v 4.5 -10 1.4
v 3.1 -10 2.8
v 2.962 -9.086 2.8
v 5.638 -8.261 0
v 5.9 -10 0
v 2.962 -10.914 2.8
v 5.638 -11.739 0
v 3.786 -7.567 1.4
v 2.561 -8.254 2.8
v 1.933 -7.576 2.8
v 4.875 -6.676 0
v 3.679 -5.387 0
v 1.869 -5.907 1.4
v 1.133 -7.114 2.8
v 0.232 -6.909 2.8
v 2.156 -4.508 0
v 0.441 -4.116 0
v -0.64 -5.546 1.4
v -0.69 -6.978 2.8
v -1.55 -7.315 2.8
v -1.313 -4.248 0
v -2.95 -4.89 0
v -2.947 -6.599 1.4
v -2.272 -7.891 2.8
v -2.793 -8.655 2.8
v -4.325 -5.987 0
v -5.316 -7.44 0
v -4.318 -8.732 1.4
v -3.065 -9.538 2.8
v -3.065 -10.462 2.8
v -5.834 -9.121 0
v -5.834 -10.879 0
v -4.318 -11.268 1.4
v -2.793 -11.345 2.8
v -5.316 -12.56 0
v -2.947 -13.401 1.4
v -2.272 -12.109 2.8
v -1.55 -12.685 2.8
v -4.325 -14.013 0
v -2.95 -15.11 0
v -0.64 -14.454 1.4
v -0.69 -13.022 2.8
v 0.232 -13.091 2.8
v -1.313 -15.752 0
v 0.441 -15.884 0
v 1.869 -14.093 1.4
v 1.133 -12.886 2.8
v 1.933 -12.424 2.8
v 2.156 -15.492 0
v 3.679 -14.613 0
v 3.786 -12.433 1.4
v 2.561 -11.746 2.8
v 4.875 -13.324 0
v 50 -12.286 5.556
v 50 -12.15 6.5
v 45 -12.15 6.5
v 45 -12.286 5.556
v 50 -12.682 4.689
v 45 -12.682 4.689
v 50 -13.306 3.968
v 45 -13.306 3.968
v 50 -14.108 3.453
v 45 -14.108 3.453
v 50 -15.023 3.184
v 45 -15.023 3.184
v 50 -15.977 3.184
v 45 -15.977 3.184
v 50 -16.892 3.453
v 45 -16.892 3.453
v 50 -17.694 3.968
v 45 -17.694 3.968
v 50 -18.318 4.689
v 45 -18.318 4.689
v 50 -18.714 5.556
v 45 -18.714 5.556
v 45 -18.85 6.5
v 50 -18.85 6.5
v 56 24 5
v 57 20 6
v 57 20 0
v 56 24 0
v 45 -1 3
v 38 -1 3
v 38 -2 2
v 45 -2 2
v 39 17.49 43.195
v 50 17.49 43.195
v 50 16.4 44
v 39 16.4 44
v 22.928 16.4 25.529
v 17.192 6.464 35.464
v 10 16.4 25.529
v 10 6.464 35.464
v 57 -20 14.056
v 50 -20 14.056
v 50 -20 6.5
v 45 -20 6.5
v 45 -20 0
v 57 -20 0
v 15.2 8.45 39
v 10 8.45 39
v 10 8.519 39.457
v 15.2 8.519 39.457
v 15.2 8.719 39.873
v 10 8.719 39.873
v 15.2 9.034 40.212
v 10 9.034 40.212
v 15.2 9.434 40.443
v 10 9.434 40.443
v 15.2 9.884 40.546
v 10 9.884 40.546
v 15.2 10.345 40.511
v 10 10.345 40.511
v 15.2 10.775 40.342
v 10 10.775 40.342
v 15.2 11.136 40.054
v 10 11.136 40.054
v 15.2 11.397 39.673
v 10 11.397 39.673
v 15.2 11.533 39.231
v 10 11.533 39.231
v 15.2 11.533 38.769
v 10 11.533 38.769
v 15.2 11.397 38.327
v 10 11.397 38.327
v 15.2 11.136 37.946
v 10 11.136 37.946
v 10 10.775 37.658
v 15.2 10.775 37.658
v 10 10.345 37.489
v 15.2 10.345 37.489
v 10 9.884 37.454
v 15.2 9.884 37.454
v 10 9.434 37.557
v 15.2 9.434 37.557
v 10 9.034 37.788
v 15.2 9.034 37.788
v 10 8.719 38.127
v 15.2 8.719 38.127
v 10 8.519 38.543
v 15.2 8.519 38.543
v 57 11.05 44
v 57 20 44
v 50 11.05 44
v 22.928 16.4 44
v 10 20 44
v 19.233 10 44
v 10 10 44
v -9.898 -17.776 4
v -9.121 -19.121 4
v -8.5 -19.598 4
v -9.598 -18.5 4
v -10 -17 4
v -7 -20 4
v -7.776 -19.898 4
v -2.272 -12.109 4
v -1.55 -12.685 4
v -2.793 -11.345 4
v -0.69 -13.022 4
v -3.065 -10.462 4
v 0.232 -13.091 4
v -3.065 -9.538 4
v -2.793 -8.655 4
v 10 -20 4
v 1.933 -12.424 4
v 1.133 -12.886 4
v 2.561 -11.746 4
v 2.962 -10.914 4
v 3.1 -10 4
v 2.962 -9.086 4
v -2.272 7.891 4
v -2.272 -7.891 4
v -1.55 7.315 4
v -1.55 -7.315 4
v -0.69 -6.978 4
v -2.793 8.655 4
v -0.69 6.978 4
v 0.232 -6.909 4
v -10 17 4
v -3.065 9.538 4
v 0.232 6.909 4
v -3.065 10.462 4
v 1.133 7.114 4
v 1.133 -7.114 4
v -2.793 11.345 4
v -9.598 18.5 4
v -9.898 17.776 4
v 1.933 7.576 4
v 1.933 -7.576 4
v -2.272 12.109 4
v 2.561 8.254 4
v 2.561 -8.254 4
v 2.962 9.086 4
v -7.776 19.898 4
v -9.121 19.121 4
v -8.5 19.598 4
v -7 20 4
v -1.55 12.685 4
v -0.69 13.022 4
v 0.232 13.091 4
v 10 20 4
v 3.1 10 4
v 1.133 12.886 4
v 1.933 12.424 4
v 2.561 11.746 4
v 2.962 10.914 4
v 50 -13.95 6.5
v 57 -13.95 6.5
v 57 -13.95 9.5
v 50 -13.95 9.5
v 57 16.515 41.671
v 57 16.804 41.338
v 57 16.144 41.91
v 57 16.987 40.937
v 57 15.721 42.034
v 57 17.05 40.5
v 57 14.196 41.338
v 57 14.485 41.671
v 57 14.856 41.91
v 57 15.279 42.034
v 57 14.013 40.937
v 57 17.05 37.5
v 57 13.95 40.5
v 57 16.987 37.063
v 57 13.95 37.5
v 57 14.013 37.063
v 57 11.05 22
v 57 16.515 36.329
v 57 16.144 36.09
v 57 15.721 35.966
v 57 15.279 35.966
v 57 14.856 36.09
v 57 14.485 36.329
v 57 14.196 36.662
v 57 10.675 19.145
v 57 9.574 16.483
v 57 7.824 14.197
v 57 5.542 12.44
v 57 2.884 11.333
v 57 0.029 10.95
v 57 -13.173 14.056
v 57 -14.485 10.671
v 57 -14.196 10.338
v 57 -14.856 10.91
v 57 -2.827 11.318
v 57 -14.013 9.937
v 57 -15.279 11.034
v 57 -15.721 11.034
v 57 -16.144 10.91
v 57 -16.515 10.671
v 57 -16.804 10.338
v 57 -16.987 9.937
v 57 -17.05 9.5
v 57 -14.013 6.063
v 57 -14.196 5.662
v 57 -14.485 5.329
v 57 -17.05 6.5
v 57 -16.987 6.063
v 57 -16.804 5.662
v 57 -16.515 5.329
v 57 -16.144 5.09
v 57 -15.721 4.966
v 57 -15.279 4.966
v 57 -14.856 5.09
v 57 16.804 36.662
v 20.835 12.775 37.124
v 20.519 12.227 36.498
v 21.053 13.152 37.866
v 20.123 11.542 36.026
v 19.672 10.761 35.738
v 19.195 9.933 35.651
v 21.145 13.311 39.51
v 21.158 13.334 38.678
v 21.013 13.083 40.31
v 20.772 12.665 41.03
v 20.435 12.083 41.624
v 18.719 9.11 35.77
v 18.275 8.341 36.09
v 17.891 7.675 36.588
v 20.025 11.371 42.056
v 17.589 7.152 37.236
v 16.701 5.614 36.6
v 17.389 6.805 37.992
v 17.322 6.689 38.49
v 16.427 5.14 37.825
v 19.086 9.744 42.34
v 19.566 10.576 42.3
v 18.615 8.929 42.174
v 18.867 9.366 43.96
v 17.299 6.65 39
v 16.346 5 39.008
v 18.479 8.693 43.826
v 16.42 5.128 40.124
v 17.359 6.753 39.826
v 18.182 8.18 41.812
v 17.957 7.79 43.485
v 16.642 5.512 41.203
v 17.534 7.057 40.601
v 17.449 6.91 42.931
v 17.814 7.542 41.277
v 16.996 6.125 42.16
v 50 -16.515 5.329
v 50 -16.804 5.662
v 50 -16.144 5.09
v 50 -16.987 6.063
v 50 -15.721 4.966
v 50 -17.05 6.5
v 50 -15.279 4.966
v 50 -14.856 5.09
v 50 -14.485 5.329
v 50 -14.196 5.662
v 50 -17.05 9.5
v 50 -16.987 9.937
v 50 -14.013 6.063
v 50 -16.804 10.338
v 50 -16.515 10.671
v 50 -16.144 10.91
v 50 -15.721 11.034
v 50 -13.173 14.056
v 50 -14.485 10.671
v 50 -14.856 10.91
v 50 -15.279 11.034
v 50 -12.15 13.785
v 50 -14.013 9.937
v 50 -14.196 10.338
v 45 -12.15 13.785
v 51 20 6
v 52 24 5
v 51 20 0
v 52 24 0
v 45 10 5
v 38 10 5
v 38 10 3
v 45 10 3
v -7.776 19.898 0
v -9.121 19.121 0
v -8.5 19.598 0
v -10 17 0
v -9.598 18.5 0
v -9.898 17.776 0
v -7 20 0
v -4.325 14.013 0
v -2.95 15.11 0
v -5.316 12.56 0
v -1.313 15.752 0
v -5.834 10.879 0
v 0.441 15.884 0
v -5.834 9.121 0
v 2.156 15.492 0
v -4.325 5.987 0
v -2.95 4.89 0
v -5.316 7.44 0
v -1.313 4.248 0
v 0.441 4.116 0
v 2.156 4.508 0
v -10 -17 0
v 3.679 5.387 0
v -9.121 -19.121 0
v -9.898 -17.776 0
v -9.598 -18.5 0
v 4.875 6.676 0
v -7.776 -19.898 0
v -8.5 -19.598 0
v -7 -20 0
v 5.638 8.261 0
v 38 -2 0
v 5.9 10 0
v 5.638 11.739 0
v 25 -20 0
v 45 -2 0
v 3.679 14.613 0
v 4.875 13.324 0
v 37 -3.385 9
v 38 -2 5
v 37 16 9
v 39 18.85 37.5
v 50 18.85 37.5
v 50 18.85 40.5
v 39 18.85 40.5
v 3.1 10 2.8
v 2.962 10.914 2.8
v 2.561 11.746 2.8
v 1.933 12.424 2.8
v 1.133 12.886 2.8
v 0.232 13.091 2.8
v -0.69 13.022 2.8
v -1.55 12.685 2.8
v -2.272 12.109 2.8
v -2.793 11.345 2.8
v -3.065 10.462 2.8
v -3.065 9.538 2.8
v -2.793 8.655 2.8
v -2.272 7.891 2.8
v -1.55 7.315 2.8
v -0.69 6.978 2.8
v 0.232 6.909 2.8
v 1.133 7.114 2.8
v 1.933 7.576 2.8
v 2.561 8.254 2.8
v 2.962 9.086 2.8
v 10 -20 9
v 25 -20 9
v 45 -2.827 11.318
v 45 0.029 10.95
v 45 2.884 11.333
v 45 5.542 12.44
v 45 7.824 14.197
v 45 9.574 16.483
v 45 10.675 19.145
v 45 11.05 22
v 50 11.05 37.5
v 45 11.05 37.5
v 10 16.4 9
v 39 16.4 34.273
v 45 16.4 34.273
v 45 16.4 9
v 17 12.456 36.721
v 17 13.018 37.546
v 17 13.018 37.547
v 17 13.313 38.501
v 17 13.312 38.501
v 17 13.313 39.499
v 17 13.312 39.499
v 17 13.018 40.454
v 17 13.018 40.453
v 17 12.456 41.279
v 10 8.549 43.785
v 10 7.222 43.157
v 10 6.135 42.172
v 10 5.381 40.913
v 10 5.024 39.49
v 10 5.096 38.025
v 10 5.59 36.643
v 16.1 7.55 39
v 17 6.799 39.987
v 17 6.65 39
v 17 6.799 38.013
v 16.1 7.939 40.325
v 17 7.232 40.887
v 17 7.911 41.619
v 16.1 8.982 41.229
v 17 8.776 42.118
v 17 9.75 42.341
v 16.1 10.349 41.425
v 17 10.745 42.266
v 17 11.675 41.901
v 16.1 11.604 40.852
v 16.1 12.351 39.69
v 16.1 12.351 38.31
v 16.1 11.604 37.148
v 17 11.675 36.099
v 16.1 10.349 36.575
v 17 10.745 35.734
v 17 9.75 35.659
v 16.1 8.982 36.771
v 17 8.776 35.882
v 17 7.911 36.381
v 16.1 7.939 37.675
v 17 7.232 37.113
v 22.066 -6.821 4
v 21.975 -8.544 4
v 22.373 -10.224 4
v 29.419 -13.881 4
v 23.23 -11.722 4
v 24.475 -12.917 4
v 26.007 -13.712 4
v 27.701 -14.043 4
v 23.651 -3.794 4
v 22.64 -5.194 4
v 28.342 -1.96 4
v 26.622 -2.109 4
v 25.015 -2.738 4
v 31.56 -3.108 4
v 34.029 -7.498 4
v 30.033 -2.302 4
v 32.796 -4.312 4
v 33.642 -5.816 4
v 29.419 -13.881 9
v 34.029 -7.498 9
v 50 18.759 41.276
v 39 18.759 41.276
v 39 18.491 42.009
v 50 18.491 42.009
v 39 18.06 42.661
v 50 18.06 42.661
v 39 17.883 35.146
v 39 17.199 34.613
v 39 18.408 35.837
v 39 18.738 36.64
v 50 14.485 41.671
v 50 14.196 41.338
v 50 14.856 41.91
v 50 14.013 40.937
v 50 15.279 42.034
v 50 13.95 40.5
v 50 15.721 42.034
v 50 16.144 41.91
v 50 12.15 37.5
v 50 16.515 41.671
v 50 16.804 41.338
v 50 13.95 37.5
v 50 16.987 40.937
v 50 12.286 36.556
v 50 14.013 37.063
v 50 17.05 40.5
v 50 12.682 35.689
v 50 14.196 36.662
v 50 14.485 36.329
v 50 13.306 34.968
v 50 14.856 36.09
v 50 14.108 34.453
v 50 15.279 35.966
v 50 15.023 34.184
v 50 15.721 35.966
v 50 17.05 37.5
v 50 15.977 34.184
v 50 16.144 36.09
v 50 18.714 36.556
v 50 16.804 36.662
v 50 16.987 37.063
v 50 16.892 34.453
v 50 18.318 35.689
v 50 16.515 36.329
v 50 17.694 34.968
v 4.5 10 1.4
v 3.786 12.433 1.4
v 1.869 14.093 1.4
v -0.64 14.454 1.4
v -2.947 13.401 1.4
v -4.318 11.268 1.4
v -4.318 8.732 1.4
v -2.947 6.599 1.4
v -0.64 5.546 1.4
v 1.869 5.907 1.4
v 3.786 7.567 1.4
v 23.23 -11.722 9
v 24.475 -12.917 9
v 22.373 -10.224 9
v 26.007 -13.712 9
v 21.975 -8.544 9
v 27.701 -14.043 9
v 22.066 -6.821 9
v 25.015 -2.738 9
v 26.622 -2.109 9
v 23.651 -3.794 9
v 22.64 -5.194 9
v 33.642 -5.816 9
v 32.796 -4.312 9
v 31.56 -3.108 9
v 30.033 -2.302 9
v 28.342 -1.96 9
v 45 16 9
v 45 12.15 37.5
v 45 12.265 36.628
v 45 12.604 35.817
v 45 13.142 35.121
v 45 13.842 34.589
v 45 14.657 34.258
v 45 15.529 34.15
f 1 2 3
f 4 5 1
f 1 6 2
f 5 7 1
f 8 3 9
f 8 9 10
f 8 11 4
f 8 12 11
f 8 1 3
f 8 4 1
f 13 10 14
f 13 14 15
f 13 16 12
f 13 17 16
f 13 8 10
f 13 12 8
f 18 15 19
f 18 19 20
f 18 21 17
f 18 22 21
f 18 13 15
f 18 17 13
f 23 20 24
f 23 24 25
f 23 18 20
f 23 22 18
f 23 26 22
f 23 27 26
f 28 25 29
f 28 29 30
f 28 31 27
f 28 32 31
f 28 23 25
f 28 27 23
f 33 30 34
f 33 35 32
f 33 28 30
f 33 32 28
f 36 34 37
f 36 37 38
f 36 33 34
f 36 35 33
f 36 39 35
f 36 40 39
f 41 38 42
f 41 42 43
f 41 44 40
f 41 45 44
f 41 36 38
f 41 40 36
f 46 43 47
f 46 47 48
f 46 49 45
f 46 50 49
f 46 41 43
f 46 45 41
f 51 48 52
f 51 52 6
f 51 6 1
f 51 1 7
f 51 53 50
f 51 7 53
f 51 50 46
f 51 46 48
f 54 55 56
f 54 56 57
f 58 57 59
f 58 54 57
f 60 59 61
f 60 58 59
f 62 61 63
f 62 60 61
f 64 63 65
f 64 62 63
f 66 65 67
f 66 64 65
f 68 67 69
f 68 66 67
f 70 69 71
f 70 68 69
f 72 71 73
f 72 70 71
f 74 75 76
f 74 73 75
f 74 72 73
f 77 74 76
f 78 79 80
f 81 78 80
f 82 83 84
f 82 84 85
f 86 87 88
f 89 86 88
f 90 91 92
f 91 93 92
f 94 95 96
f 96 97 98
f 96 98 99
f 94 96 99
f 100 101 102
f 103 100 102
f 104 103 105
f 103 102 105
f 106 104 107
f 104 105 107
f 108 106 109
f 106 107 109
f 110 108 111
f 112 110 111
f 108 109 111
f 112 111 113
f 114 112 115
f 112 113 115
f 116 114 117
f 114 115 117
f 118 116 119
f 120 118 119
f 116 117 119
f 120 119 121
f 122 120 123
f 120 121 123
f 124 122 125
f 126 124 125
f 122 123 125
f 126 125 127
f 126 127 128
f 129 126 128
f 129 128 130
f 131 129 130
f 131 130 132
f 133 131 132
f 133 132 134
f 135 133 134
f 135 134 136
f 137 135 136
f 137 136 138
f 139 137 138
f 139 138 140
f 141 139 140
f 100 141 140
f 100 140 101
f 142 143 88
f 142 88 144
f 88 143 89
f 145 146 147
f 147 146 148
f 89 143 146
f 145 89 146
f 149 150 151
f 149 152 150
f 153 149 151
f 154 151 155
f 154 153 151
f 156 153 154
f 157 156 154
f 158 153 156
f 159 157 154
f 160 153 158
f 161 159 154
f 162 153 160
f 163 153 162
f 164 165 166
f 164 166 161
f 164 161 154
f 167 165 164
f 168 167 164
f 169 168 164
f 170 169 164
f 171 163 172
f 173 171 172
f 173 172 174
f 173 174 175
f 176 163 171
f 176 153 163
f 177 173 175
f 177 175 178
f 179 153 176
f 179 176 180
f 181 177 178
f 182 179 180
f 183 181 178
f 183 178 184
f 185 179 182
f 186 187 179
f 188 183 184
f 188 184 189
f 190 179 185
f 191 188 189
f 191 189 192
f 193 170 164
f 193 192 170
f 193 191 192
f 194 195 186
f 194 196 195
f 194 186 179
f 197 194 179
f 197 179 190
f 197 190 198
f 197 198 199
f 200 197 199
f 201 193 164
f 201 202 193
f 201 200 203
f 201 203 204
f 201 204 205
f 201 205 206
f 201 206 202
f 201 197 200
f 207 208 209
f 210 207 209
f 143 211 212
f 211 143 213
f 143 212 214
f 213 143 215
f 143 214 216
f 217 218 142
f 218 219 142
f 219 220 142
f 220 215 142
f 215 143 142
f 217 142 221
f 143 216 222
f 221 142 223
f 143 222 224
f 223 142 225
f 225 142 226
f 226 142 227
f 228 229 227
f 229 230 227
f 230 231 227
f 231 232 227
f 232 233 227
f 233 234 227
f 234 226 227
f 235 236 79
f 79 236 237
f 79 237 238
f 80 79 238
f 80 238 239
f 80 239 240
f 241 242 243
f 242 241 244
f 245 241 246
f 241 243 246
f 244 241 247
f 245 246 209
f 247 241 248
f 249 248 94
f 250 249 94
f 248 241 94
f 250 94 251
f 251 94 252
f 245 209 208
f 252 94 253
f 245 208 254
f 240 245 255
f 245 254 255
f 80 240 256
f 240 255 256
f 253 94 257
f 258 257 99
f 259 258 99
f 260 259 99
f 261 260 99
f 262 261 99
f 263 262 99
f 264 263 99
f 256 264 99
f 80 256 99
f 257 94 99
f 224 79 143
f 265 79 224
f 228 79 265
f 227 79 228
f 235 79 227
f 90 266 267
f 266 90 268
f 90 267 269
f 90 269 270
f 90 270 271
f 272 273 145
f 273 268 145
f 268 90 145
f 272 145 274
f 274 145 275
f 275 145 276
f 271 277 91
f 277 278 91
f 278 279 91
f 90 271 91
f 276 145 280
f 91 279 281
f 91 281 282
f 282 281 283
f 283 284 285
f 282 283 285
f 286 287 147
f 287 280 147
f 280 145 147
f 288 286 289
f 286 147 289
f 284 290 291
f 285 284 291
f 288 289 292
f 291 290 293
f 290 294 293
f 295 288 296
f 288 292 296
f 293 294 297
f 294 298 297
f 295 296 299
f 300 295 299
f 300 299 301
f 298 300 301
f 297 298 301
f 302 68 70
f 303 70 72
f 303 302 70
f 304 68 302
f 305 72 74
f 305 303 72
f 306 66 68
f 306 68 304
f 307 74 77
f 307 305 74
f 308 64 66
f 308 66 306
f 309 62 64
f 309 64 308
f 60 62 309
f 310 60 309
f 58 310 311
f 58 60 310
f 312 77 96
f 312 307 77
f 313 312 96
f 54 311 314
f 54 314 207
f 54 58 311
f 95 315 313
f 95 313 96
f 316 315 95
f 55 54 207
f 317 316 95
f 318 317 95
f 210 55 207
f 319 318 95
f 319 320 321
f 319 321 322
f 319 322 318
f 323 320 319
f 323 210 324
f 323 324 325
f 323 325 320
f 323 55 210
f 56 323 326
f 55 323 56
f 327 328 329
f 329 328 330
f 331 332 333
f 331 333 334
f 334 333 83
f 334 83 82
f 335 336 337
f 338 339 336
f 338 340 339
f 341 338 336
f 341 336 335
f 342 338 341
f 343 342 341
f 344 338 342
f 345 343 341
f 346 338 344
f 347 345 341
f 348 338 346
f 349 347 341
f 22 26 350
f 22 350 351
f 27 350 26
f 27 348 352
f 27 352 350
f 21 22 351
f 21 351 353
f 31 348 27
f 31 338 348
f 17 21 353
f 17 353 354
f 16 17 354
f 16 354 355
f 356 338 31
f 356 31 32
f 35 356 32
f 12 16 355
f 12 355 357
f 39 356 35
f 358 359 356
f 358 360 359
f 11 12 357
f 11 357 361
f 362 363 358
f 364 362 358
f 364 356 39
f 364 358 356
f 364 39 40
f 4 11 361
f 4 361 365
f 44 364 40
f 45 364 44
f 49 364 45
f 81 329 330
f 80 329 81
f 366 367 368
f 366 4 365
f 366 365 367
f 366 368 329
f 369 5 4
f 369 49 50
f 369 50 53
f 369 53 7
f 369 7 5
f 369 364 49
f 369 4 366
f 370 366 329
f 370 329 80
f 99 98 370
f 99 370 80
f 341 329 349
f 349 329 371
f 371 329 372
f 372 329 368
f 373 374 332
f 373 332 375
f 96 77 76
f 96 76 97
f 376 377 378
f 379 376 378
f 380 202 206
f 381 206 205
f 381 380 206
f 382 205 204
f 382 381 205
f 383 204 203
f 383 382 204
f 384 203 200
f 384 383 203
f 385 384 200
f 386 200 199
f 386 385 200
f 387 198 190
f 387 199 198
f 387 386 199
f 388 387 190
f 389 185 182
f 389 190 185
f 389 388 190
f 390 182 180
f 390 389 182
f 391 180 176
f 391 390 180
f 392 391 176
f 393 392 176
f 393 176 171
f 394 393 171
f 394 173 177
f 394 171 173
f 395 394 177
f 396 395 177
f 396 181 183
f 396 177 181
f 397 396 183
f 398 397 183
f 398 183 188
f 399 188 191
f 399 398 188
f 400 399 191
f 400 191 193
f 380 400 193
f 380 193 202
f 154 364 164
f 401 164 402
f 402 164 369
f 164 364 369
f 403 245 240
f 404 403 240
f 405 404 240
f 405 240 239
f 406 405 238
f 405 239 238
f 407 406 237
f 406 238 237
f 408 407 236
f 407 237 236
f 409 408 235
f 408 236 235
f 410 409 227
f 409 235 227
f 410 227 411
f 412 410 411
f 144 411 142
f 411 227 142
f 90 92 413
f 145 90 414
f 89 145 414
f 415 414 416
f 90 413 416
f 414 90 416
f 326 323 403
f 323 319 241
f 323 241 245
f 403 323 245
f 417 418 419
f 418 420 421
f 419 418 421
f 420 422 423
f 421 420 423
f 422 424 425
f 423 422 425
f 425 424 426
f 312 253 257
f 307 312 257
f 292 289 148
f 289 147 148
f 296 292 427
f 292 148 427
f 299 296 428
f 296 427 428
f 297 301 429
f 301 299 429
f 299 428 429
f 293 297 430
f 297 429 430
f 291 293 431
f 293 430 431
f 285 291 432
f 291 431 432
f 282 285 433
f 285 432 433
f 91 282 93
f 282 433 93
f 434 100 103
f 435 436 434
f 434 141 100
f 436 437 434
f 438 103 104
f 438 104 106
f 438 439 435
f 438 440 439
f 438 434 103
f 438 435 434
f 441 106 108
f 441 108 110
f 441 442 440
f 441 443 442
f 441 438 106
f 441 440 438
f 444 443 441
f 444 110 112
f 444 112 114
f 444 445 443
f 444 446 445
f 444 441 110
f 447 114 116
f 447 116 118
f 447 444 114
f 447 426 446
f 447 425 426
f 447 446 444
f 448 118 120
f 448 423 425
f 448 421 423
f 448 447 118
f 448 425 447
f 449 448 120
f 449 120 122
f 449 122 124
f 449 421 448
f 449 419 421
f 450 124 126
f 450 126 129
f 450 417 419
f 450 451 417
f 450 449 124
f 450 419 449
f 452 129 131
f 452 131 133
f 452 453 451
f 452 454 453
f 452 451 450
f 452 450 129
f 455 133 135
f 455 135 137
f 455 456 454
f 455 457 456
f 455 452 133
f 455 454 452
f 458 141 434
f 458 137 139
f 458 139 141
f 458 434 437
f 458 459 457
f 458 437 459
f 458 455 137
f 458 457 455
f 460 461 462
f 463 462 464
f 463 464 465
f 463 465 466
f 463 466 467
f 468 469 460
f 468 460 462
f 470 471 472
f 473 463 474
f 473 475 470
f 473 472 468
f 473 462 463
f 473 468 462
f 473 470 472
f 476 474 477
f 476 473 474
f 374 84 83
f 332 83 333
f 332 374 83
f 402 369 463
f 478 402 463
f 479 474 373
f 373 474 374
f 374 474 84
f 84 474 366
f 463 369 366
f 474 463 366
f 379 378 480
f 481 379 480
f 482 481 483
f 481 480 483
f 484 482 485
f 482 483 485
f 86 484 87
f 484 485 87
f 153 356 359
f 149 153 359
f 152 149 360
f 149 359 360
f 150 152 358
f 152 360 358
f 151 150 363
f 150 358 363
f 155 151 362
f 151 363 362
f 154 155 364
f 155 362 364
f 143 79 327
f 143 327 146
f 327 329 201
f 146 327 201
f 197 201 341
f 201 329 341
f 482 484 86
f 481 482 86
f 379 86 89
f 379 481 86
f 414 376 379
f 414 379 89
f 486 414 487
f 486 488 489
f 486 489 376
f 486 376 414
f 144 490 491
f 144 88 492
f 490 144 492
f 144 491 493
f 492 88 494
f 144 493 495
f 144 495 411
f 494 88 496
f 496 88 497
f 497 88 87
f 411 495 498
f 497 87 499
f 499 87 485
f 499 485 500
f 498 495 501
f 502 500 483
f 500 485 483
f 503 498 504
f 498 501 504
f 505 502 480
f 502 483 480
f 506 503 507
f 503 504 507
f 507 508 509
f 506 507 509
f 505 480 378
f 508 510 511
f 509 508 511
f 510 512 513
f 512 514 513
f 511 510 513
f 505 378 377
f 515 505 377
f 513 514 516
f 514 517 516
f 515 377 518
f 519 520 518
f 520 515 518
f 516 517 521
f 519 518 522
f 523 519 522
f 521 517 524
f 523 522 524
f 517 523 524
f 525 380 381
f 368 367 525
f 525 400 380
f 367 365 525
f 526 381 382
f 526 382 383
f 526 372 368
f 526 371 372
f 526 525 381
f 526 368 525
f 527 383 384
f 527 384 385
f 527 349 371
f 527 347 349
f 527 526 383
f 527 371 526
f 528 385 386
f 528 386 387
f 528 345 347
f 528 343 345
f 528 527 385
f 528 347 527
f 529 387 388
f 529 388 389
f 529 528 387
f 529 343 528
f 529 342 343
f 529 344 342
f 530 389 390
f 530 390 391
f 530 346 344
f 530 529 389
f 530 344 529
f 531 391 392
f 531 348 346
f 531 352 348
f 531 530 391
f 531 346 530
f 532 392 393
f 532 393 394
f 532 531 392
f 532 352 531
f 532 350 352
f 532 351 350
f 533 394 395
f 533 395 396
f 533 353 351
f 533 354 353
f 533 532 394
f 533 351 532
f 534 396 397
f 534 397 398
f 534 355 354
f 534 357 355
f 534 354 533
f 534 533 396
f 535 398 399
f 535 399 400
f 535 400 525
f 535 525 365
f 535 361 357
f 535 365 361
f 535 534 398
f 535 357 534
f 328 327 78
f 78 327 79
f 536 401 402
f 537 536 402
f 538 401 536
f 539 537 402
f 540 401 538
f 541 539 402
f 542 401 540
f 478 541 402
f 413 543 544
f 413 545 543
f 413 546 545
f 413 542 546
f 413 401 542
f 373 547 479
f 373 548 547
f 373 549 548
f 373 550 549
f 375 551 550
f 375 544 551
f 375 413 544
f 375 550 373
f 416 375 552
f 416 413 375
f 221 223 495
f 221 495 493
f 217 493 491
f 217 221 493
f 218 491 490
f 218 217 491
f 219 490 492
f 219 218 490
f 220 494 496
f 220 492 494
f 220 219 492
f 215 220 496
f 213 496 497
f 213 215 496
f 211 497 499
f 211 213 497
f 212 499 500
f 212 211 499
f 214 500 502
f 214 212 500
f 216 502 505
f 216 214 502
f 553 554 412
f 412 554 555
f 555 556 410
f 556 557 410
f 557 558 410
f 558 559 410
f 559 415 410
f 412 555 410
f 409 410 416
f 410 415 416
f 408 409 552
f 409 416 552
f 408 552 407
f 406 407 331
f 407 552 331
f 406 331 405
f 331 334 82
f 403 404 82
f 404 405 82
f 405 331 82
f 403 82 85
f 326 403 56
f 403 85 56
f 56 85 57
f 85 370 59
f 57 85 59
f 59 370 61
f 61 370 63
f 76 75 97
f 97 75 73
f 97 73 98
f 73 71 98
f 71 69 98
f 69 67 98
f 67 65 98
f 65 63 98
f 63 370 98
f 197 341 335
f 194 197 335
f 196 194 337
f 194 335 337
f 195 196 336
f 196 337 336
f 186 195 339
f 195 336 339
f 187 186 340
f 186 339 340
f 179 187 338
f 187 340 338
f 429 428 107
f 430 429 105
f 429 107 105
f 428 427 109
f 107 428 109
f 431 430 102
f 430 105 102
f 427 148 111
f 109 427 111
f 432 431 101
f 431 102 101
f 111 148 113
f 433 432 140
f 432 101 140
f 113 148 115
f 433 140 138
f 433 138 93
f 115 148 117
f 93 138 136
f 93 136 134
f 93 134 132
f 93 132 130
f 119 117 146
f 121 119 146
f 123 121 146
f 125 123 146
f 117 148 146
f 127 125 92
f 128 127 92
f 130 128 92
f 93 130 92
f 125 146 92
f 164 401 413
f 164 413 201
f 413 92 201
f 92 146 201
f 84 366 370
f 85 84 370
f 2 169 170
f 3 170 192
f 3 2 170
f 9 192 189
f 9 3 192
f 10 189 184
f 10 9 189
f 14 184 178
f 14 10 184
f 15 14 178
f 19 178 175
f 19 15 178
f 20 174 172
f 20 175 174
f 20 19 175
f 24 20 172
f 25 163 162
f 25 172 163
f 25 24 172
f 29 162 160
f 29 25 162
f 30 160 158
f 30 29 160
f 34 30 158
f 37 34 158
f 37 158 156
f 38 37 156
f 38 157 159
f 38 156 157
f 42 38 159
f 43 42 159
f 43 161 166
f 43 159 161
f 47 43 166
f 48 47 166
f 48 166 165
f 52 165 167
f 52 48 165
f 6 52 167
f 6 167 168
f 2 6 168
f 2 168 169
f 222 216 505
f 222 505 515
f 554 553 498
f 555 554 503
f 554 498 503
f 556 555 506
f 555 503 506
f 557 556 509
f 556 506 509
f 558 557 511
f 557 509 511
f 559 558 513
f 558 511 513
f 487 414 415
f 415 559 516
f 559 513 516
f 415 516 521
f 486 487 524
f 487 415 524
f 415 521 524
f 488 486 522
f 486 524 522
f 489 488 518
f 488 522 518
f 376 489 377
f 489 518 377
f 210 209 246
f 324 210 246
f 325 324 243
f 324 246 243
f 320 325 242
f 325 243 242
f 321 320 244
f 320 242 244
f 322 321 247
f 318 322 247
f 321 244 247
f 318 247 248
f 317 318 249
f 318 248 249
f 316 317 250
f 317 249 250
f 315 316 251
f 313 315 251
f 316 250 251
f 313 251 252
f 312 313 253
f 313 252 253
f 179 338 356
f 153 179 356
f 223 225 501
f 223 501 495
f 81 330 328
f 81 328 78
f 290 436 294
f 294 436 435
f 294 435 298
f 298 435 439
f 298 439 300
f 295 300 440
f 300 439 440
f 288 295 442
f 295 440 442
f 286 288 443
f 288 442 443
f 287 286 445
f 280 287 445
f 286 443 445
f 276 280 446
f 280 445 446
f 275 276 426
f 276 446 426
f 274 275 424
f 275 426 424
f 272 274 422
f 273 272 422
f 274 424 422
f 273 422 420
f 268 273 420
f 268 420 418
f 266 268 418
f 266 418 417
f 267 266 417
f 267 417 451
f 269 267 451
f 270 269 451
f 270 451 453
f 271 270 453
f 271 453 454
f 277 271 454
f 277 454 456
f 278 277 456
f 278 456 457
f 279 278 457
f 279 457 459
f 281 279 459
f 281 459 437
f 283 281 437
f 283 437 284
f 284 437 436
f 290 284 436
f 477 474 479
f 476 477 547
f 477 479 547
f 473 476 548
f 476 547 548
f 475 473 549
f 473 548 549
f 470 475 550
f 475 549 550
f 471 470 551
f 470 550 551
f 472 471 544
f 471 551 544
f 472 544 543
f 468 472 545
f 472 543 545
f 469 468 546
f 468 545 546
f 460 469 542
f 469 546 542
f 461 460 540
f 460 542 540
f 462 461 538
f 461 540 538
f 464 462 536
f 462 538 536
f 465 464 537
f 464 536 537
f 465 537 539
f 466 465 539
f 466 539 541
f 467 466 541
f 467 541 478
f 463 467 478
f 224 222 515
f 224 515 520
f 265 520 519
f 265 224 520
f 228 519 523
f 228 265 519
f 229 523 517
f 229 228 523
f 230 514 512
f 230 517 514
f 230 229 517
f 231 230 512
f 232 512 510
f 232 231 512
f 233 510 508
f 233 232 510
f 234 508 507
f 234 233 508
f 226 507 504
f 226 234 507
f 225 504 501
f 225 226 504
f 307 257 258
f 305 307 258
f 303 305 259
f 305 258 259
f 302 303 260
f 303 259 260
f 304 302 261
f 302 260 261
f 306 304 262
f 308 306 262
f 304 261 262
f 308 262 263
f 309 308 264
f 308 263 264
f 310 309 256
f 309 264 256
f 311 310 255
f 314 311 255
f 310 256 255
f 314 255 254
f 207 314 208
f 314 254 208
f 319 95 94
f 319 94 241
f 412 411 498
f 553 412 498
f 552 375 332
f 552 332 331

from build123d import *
from OCP.BRepFilletAPI import BRepFilletAPI_MakeChamfer

# Parameters (mm, degrees)
SKETCH1_R           = 3.1
BOSS_EXTRUDE1_DEPTH = 9
SKETCH2_W           = 20
SKETCH2_H           = 40
CUT_EXTRUDE1_DEPTH  = 5
SKETCH3_R           = 6.05
CUT_EXTRUDE2_DEPTH  = 5
BOSS_EXTRUDE2_DEPTH = 35
SKETCH5_W           = 7
SKETCH5_H           = 12
CUT_EXTRUDE3_DEPTH  = 6
CHAMFER1_SIZE       = 6
CHAMFER1_SIZE2      = 4
CHAMFER2_SIZE       = 1
CUT_EXTRUDE4_DEPTH  = 12
CUT_EXTRUDE5_START  = -7
CUT_EXTRUDE5_DEPTH  = 11
SKETCH8_W           = 6
SKETCH8_H           = 6
BOSS_EXTRUDE3_DEPTH = 4
CHAMFER5_SIZE       = 4
CHAMFER5_SIZE_2     = 1
CHAMFER6_SIZE       = 1
CHAMFER6_SIZE2      = 4
CHAMFER7_SIZE       = 2.8
BOSS_EXTRUDE4_DEPTH = 6
CHAMFER8_START      = 16
CHAMFER8_DEPTH      = 0.515103423
CHAMFER8_START_2    = 16.515103423
CHAMFER8_2_DEPTH    = 6.413099807
CHAMFER8_START_3    = 11.656406461
CHAMFER8_3_DEPTH    = 6.343593539
CUT_EXTRUDE6_REACH  = 70.71
SKETCH10_R          = 1.55
CUT_EXTRUDE7_REACH  = 77.71
CUT_EXTRUDE7_START  = -7
SKETCH11_R          = 3.35
CHAMFER9_SIZE       = 1.8


with BuildPart() as part:
    # Sketch1 → Boss-Extrude1 (new body)
    with BuildSketch(Plane.XY):
        with BuildLine():
            Line((-10, 17), (-10, -17))
            ThreePointArc((-10, -17), (-9.121320344, -19.121320344), (-7, -20))
            Line((-7, -20), (10, -20))
            Line((10, -20), (25, -20))
            Line((25, -20), (38, -2))
            Line((38, -2), (45, -2))
            Line((45, -2), (45, -20))
            Line((45, -20), (57, -20))
            Line((57, -20), (57, 20))
            Line((57, 20), (-7, 20))
            ThreePointArc((-7, 20), (-9.121320344, 19.121320344), (-10, 17))
        make_face()
        with Locations((0, 10)):
            Circle(SKETCH1_R, mode=Mode.SUBTRACT)
        with Locations((0, -10)):
            Circle(SKETCH1_R, mode=Mode.SUBTRACT)
    extrude(amount=BOSS_EXTRUDE1_DEPTH)

    # Sketch2 → Cut-Extrude1 (cut)
    with BuildSketch(Plane.XY.offset(9)):
        Rectangle(SKETCH2_W, SKETCH2_H)
    extrude(amount=-CUT_EXTRUDE1_DEPTH, mode=Mode.SUBTRACT)

    # Sketch3 → Cut-Extrude2 (cut)
    with BuildSketch(Plane.XY.offset(9)):
        with Locations((28, -8)):
            Circle(SKETCH3_R)
    extrude(amount=-CUT_EXTRUDE2_DEPTH, mode=Mode.SUBTRACT)

    # Sketch4 → Boss-Extrude2 (add)
    with BuildSketch(Plane.XY.offset(9)):
        Polygon((45, -20), (57, -20), (57, 20), (10, 20), (10, 16.4), (45, 16.4), align=None)
    extrude(amount=BOSS_EXTRUDE2_DEPTH)

    # Sketch5 → Cut-Extrude3 (cut)
    with BuildSketch(Plane.XY.offset(9)):
        with Locations((41.5, 4)):
            Rectangle(SKETCH5_W, SKETCH5_H)
    extrude(amount=-CUT_EXTRUDE3_DEPTH, mode=Mode.SUBTRACT)

    # Chamfer1
    chamfer1_edges = [part.edges().sort_by_distance(p)[0] for p in [
        (41.5, 10, 9),
    ]]
    chamfer1_side = [part.faces().sort_by_distance(p)[0] for p in [
        (23.115817962, 1.462286031, 9),
    ]]
    chamfer(chamfer1_edges, length=CHAMFER1_SIZE, length2=CHAMFER1_SIZE2, reference=chamfer1_side[0])

    # Chamfer2
    chamfer2_edges = [part.edges().sort_by_distance(p)[0] for p in [
        (41.5, -2, 3),
    ]]
    chamfer(chamfer2_edges, length=CHAMFER2_SIZE)

    # Sketch6 → Cut-Extrude4 (cut)
    with BuildSketch(Plane(origin=(57, 0, 0), x_dir=(0, 0, -1), z_dir=(1, 0, 0))):
        with BuildLine():
            Line((-22, 11.05), (-44, 11.05))
            Line((-44, 11.05), (-44, -20))
            Line((-44, -20), (-14.055648488, -20))
            Line((-14.055648488, -20), (-14.055648488, -13.173106135))
            Line((-14.055648488, -13.173106135), (-11.317710156, -2.826868177))
            ThreePointArc((-11.317710156, -2.826868177), (-13.243876618, 6.740385992), (-22, 11.05))
        make_face()
        with BuildLine():
            Line((-40.5, 17.05), (-37.5, 17.05))
            ThreePointArc((-37.5, 17.05), (-35.95, 15.5), (-37.5, 13.95))
            Line((-37.5, 13.95), (-40.5, 13.95))
            ThreePointArc((-40.5, 13.95), (-42.05, 15.5), (-40.5, 17.05))
        make_face()
        with BuildLine():
            Line((-9.5, -17.05), (-6.5, -17.05))
            ThreePointArc((-6.5, -17.05), (-4.95, -15.5), (-6.5, -13.95))
            Line((-6.5, -13.95), (-9.5, -13.95))
            ThreePointArc((-9.5, -13.95), (-11.05, -15.5), (-9.5, -17.05))
        make_face()
    extrude(amount=-CUT_EXTRUDE4_DEPTH, mode=Mode.SUBTRACT)

    # Sketch7 → Cut-Extrude5 (cut)
    with BuildSketch(Plane(origin=(57, 0, 0), x_dir=(0, 0, -1), z_dir=(1, 0, 0)).offset(CUT_EXTRUDE5_START)):
        with BuildLine():
            Line((-6.5, -18.85), (-6.5, -20))
            Line((-6.5, -20), (-14.055648488, -20))
            Line((-14.055648488, -20), (-14.055648488, -12.15))
            Line((-14.055648488, -12.15), (-6.5, -12.15))
            ThreePointArc((-6.5, -12.15), (-3.15, -15.5), (-6.5, -18.85))
        make_face()
        with BuildLine():
            Line((-37.5, 18.85), (-40.5, 18.85))
            ThreePointArc((-40.5, 18.85), (-42.009108789, 18.490834443), (-43.194623608, 17.490352635))
            Line((-43.194623608, 17.490352635), (-44, 16.4))
            Line((-44, 16.4), (-44, 11.05))
            Line((-44, 11.05), (-37.5, 11.05))
            Line((-37.5, 11.05), (-37.5, 12.15))
            ThreePointArc((-37.5, 12.15), (-34.15, 15.5), (-37.5, 18.85))
        make_face()
    extrude(amount=-CUT_EXTRUDE5_DEPTH, mode=Mode.SUBTRACT)

    # Sketch8 → Boss-Extrude3 (add)
    with BuildSketch(Plane(origin=(0, 20, 0), x_dir=(1, 0, 0), z_dir=(0, 1, 0))):
        with Locations((54, -3)):
            Rectangle(SKETCH8_W, SKETCH8_H)
    extrude(amount=BOSS_EXTRUDE3_DEPTH)

    # Chamfer5
    chamfer5_edges_1 = [part.edges().sort_by_distance(p)[0] for p in [
        (51, 24, 3),
    ]]
    chamfer5_side_1 = [part.faces().sort_by_distance(p)[0] for p in [
        (51, 23.98, 3),
    ]]
    chamfer5_edges_2 = [part.edges().sort_by_distance(p)[0] for p in [
        (54, 24, 6),
    ]]
    chamfer5_side_2 = [part.faces().sort_by_distance(p)[0] for p in [
        (54, 24, 5.98),
    ]]
    chamfer5_edges_3 = [part.edges().sort_by_distance(p)[0] for p in [
        (57, 24, 3),
    ]]
    chamfer5_side_3 = [part.faces().sort_by_distance(p)[0] for p in [
        (56.98, 24, 3),
    ]]
    chamfer5 = BRepFilletAPI_MakeChamfer(part.part.solid().wrapped)
    for e in chamfer5_edges_1:
        chamfer5.Add(CHAMFER5_SIZE - 0.0001, CHAMFER5_SIZE_2 - 0.0001, e.wrapped, chamfer5_side_1[0].wrapped)
    for e in chamfer5_edges_2:
        chamfer5.Add(CHAMFER5_SIZE_2 - 0.0001, CHAMFER5_SIZE - 0.0001, e.wrapped, chamfer5_side_2[0].wrapped)
    for e in chamfer5_edges_3:
        chamfer5.Add(CHAMFER5_SIZE_2 - 0.0001, CHAMFER5_SIZE - 0.0001, e.wrapped, chamfer5_side_3[0].wrapped)
    add(Compound.cast(chamfer5.Shape()), mode=Mode.REPLACE)  # a hair under: the kernel refuses the full size

    # Chamfer6
    chamfer6_edges = [part.edges().sort_by_distance(p)[0] for p in [
        (38, 7, 9),
    ]]
    chamfer6_side = [part.faces().sort_by_distance(p)[0] for p in [
        (22.148058049, 0.854930368, 9),
    ]]
    chamfer(chamfer6_edges, length=CHAMFER6_SIZE, length2=CHAMFER6_SIZE2, reference=chamfer6_side[0])

    # Chamfer7
    chamfer7_edges = [part.edges().sort_by_distance(p)[0] for p in [
        (-3.1, 10, 0),
        (-3.1, -10, 0),
    ]]
    chamfer(chamfer7_edges, length=CHAMFER7_SIZE)

    # Sketch9 → Boss-Extrude4 (add)
    with BuildSketch(Plane.ZY.offset(-10)):
        with BuildLine():
            Line((44, 16.4), (44, 10))
            ThreePointArc((44, 10), (40.913417162, 5.380602337), (35.464466094, 6.464466094))
            Line((35.464466094, 6.464466094), (25.528932188, 16.4))
            Line((25.528932188, 16.4), (44, 16.4))
        make_face()
    extrude(amount=-BOSS_EXTRUDE4_DEPTH)

    # Chamfer8: read off the stored shape, not the designer's step
    # Chamfer8 outline → Chamfer8 (add)
    with BuildSketch(Plane.YZ.offset(CHAMFER8_START)):
        with BuildLine():
            ThreePointArc((10, 44), (5.380602337, 40.913417162), (6.464466094, 35.464466094))
            Line((6.464466094, 35.464466094), (16.4, 25.528932188))
            Line((16.4, 25.528932188), (16.4, 44))
            Line((16.4, 44), (10, 44))
        make_face()
    extrude(amount=CHAMFER8_DEPTH)

    # Chamfer8 2 outline → Chamfer8 2 (add)
    with BuildSketch(Plane.YZ.offset(CHAMFER8_START_2)):
        with BuildLine():
            ThreePointArc((10, 44), (5.380602337, 40.913417162), (6.464466094, 35.464466094))
            Line((6.464466094, 35.464466094), (16.4, 25.528932188))
            Line((16.4, 25.528932188), (16.4, 44))
            Line((16.4, 44), (10, 44))
        make_face()
    extrude(amount=CHAMFER8_2_DEPTH)

    # Chamfer8 3 outline → Chamfer8 3 (cut)
    with BuildSketch(Plane(origin=(0, 0, 0), x_dir=(0.500000000000006, 0.8660254037844353, 0), z_dir=(0.8660254037844352, -0.5000000000000061, 0)).offset(CHAMFER8_START_3)):
        with BuildLine():
            add(Edge.make_bspline(
                [(14.194351887, 35.464466094), (4.33836629, 44), (18.276834792, 44)],
                knots=[5.497787144, 5.497787144, 5.497787144, 7.853981634, 7.853981634, 7.853981634], degree=2, weights=[1, 0.382683432, 1]))
            Line((14.194351887, 35.464466094), (25.666918237, 25.528932188))
            Line((25.666918237, 25.528932188), (25.666918237, 44))
            Line((25.666918237, 44), (18.276834792, 44))
        make_face()
    extrude(amount=CHAMFER8_3_DEPTH, mode=Mode.SUBTRACT)

    # Cut-Extrude6: up to this plane
    cut_extrude6_end = Plane(origin=(22.92820323, 16.4, 44), z_dir=(-0.8660254037844355, 0.5000000000000057, 0))
    # Sketch10 → Cut-Extrude6 (cut, up to the surface)
    with BuildSketch(Plane.ZY.offset(-10), mode=Mode.PRIVATE) as cut_extrude6_sk1:
        with Locations(Location((39, 10, 0), (0, 0, 270))):
            Circle(SKETCH10_R)
    cut_extrude6_tool1 = split(extrude(cut_extrude6_sk1.sketch, amount=-CUT_EXTRUDE6_REACH, mode=Mode.PRIVATE), bisect_by=cut_extrude6_end, keep=Keep.BOTH, mode=Mode.PRIVATE)
    add(cut_extrude6_tool1.solids().sort_by_distance((10, 10, 39))[0], mode=Mode.SUBTRACT)

    # Sketch11 → Cut-Extrude7 (cut, up to next)
    with BuildSketch(Plane.ZY.offset(-10).offset(CUT_EXTRUDE7_START), mode=Mode.PRIVATE) as cut_extrude7_sk1:
        with Locations(Location((39, 10, 0), (0, 0, 270))):
            Circle(SKETCH11_R)
    cut_extrude7_tool1 = extrude(cut_extrude7_sk1.sketch, amount=-CUT_EXTRUDE7_REACH, mode=Mode.PRIVATE) & part.part
    add(cut_extrude7_tool1.solids().sort_by_distance((17, 10, 39))[0], mode=Mode.SUBTRACT)

    # Chamfer9
    chamfer9_edges = [part.edges().sort_by_distance(p)[0] for p in [
        (17, 11.55, 39),
    ]]
    chamfer(chamfer9_edges, length=CHAMFER9_SIZE - 0.0001)  # a hair under: the kernel refuses the full size


solid = part.part
